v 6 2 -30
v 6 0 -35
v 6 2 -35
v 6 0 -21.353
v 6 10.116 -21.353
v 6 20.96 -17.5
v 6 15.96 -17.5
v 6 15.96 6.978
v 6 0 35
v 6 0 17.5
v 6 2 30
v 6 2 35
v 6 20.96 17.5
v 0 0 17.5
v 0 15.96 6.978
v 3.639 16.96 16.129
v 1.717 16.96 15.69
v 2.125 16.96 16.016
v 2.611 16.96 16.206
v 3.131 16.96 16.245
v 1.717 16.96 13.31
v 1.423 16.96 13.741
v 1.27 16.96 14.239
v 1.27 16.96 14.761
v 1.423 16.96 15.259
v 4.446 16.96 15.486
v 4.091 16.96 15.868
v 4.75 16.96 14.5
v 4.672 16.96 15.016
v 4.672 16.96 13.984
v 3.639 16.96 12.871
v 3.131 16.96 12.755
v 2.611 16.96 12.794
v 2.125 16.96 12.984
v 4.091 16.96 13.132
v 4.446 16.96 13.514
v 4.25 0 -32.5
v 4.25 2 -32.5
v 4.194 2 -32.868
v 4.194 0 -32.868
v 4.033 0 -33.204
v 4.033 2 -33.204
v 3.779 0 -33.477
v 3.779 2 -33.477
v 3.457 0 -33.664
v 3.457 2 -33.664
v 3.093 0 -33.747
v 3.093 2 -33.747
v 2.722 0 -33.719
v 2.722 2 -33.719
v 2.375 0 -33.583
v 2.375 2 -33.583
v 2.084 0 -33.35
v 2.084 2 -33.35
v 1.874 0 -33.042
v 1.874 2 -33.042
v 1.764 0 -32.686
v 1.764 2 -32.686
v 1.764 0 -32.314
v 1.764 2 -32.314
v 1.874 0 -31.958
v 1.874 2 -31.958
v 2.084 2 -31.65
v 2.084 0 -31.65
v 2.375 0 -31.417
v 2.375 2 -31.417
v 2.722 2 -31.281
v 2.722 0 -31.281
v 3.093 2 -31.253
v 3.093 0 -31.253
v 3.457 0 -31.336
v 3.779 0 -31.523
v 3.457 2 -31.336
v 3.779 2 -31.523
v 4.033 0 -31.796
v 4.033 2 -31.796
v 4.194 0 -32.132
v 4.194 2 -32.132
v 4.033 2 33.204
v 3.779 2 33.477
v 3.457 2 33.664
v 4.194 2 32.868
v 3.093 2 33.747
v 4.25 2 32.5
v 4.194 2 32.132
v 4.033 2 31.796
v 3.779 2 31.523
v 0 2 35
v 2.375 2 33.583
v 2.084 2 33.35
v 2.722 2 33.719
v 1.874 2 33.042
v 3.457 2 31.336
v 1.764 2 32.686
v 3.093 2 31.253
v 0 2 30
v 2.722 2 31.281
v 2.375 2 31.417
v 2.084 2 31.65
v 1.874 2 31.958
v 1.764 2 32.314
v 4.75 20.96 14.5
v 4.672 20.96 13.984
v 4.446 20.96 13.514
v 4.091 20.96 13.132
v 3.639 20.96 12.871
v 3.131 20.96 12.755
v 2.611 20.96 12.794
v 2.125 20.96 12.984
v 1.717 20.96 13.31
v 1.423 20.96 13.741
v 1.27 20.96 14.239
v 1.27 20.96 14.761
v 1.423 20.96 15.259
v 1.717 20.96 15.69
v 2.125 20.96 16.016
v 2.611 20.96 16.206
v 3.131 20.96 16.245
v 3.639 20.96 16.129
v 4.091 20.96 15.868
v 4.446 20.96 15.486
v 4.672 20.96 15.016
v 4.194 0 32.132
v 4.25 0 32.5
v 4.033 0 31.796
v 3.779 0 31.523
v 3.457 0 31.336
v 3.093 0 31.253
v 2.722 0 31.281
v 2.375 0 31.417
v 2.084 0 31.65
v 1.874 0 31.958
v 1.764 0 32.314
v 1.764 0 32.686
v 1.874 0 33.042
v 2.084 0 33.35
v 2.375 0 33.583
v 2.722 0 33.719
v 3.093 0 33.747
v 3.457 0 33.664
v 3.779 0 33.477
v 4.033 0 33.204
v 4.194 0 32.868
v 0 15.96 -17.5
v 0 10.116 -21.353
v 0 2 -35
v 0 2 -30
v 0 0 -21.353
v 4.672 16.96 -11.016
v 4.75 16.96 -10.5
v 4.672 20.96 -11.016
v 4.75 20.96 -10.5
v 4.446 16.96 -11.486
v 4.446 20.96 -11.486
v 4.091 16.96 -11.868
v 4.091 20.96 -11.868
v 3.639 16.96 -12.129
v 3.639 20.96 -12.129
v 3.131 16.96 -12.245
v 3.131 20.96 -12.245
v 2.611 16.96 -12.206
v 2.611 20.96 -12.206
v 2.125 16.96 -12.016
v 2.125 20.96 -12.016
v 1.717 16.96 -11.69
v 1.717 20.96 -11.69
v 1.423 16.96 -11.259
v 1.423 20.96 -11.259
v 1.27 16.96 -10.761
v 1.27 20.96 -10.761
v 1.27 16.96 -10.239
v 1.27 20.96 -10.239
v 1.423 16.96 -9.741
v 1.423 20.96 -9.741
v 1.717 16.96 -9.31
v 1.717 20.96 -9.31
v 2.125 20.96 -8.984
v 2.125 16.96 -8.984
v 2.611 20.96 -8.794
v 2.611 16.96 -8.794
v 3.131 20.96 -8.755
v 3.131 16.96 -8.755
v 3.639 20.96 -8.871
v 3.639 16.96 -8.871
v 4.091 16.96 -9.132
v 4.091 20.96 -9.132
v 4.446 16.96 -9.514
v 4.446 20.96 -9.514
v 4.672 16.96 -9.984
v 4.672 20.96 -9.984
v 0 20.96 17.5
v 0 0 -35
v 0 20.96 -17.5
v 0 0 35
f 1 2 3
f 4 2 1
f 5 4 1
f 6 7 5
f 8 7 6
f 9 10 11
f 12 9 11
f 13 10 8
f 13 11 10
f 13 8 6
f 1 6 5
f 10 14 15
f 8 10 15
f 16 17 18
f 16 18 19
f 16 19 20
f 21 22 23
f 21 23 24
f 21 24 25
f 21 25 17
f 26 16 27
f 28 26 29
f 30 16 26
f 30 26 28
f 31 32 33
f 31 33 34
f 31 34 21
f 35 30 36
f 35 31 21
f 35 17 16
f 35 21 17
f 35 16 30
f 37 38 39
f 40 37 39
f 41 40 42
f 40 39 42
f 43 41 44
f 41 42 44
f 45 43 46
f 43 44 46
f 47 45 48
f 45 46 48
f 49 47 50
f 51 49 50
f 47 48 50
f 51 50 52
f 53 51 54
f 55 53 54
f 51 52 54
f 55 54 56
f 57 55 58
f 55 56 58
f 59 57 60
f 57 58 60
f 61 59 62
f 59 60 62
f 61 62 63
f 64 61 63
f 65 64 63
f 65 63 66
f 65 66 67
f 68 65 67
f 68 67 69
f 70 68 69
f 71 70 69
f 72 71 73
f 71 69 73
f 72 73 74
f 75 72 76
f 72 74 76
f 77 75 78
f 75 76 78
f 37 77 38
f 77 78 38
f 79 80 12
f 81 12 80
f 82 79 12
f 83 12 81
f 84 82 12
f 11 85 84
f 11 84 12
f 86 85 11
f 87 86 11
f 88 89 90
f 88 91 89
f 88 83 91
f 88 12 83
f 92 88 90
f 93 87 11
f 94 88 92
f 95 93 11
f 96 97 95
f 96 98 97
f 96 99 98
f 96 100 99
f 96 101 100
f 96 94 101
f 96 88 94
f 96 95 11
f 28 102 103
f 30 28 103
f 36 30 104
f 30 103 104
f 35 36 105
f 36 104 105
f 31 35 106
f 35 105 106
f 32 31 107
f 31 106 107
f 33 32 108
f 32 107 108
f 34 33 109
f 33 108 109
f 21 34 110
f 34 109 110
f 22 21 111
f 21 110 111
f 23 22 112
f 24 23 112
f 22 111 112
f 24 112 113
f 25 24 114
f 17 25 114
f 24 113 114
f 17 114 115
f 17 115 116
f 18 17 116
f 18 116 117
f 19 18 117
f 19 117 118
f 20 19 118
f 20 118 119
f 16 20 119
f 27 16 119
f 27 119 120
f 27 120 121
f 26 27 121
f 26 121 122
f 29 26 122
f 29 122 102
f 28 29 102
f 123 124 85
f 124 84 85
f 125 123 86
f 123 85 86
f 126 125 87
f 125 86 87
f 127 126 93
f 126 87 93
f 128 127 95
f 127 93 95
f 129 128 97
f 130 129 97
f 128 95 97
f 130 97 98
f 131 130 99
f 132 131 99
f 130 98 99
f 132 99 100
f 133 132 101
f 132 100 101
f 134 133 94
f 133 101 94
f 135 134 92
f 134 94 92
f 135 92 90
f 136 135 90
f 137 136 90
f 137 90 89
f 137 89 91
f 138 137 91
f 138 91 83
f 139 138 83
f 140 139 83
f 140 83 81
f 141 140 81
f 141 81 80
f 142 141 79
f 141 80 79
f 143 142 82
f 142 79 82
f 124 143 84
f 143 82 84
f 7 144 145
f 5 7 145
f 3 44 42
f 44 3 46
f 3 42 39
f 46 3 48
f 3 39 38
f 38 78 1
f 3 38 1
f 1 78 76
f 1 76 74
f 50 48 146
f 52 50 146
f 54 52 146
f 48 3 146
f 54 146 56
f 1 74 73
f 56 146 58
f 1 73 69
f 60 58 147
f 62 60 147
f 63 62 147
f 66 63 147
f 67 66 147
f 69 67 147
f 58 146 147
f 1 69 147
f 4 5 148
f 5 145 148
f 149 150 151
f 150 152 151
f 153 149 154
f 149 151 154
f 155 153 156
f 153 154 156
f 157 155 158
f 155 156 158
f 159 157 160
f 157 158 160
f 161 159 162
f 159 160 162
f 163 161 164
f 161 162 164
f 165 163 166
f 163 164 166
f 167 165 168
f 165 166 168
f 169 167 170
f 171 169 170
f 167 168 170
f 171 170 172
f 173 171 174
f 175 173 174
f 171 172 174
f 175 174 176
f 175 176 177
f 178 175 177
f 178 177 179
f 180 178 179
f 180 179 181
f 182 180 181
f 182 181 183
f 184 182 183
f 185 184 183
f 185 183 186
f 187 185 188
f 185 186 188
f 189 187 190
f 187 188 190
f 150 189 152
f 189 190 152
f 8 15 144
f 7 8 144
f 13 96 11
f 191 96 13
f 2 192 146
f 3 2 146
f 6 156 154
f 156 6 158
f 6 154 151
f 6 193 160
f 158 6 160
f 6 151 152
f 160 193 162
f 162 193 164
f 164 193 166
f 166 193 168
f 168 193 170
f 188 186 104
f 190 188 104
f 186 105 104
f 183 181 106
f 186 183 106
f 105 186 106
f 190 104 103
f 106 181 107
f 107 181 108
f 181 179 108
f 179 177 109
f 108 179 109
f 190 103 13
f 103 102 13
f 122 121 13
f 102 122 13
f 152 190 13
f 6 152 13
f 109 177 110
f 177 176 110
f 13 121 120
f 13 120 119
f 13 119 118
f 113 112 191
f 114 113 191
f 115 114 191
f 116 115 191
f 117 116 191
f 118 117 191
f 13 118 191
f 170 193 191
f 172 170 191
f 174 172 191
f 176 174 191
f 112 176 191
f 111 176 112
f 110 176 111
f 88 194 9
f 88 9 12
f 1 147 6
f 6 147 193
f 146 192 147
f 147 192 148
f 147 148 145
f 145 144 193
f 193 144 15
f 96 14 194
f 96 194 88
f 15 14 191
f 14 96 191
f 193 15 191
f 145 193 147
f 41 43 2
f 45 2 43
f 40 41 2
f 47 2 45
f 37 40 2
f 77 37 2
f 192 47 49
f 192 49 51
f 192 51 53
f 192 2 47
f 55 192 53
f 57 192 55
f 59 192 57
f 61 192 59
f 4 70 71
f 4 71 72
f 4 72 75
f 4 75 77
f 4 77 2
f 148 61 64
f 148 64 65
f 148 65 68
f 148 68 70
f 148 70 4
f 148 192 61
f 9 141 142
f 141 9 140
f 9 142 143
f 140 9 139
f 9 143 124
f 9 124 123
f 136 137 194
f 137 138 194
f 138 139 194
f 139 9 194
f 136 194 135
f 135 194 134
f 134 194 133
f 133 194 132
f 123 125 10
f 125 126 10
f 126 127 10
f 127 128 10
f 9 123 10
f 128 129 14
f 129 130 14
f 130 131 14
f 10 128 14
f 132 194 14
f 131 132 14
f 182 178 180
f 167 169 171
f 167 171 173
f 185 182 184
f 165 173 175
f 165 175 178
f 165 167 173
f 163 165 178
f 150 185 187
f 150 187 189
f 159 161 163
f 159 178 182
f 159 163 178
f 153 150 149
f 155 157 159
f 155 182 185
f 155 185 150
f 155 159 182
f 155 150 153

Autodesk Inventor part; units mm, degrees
ref_plane "YZ Plane" through (0, 0, 0) normal (1, 0, 0) x (0, 1, 0)
ref_plane "XZ Plane" through (0, 0, 0) normal (0, 1, 0) x (-1, 0, 0)
ref_plane "XY Plane" through (0, 0, 0) normal (0, 0, 1) x (1, 0, 0)
sketch "Эскиз1" plane through (0, 0, 0) normal (1, 0, 0) x (0, 1, 0)
  line L0 (0, 35) -> (20.96, 35) construction
  line L1 (20.96, 35) -> (20.96, -35) construction
  line L2 (20.96, -35) -> (0, -35) construction
  line L3 (0, -35) -> (0, 35) construction
  line L4 (13, 12.5) -> (0, 12.5) construction
  line L5 (0, 12.5) -> (0, -12.5) construction
  line L6 (0, -12.5) -> (13, -12.5) construction
  line L7 (13, -12.5) -> (13, 12.5) construction
  line L8 (20.96, 17.5) -> (15.96, 17.5)
  line L9 (15.96, 17.5) -> (15.96, -17.5)
  line L10 (15.96, -17.5) -> (20.96, -17.5)
  line L11 (20.96, -17.5) -> (20.96, 17.5)
  line L12 (0, 35) -> (2, 35)
  line L13 (2, 35) -> (2, 30)
  line L14 (2, 30) -> (0, 30)
  line L15 (0, 30) -> (0, 35)
  line L16 (15.96, 17.5) -> (0, 17.5)
  line L17 (0, 30) -> (0, 17.5)
  line L18 (2, 30) -> (20.96, 17.5)
  line L19 (20.96, 0) -> (0, 0) construction
  line L20 (0, -35) -> (2, -35)
  line L21 (2, -35) -> (2, -30)
  line L22 (2, -30) -> (0, -30)
  line L23 (0, -30) -> (0, -35)
  line L24 (15.96, -17.5) -> (0, -17.5)
  line L25 (0, -30) -> (0, -17.5)
  line L26 (2, -30) -> (20.96, -17.5)
  line L27 (15.96, -17.5) -> (15.96, -17.5)
  line L28 (15.96, -17.5) -> (10.1158, -21.353)
  line L29 (15.96, -17.5) -> (22.96, -17.5) construction
  line L30 (10.1158, -21.353) -> (0, -21.353)
  line L31 (0, 17.5) -> (15.96, 6.9778)
  dimension "d0" = 20.96
  dimension "d1" = 70
  dimension "d2" = 13
  dimension "d3" = 25
  dimension "d4" = 5
  dimension "d5" = 35
  dimension "d6" = 2
  dimension "d7" = 5
  dimension "d25" = 0
  dimension "d26" = 7
extrude "Выдавливание1" add sketch "Эскиз1" along normal blind 6 contours L11 L10 L9 L8 | L8 L16 L17 L14 L18 | L9 L31 L16 | L26 L22 L25 L30 L28 L10 | L14 L15 L12 L13 | L21 L20 L23 L22
sketch "Эскиз2" plane through (0, 20.96, 17.5) normal (0, 1, 0) x (1, 0, 0)
  line L0 (0, 0) -> (6, 0) projected
  line L1 (3, 0) -> (3, 31) construction
  line L2 (0, 31) -> (6, 31) projected
  line L3 (3, 3) -> (3, 28) construction
  circle A0 centre (3, 3) radius 1.75
  circle A1 centre (3, 28) radius 1.75
  point P0 (0, 17.5)
  point P1 (3, 15.5)
  dimension "d10" = 25
  dimension "d11" = 3.5
  dimension "d12" = 3.5
extrude "Выдавливание2" cut sketch "Эскиз2" against normal blind 4
sketch "Эскиз3" plane through (0, 2, 35) normal (0, 1, 0) x (1, 0, 0)
  line L0 (0, 0) -> (6, 0) construction
  line L1 (6, 17.5) -> (6, 5) projected
  line L2 (0, 0) -> (6, 0) construction
  line L3 (6, 0) -> (6, 5) construction
  line L4 (6, 5) -> (0, 5) construction
  line L5 (0, 5) -> (0, 0) construction
  line L6 (6, 56.353) -> (6, 70) projected
  line L7 (0, 65) -> (0, 52.5) projected
  line L8 (6, 70) -> (0, 70) construction
  line L9 (0, 70) -> (0, 65) construction
  line L10 (0, 65) -> (6, 65) construction
  line L11 (6, 65) -> (6, 70) construction
  line L12 (0, 5) -> (0, 0) construction
  line L13 (0, 2.5) -> (6, 2.5) construction
  line L14 (3, 0) -> (3, 5) construction
  line L15 (0, 67.5) -> (6, 67.5) construction
  line L16 (3, 65) -> (3, 70) construction
  circle A0 centre (3, 2.5) radius 1.25
  circle A1 centre (3, 67.5) radius 1.25
  point P0 (0, 35)
  point P1 (6, 55.5)
  dimension "d21" = 2.5
  dimension "d22" = 2.5
extrude "Выдавливание3" cut sketch "Эскиз3" against normal blind 2
properties part number "low_part_of_extrad_system"
